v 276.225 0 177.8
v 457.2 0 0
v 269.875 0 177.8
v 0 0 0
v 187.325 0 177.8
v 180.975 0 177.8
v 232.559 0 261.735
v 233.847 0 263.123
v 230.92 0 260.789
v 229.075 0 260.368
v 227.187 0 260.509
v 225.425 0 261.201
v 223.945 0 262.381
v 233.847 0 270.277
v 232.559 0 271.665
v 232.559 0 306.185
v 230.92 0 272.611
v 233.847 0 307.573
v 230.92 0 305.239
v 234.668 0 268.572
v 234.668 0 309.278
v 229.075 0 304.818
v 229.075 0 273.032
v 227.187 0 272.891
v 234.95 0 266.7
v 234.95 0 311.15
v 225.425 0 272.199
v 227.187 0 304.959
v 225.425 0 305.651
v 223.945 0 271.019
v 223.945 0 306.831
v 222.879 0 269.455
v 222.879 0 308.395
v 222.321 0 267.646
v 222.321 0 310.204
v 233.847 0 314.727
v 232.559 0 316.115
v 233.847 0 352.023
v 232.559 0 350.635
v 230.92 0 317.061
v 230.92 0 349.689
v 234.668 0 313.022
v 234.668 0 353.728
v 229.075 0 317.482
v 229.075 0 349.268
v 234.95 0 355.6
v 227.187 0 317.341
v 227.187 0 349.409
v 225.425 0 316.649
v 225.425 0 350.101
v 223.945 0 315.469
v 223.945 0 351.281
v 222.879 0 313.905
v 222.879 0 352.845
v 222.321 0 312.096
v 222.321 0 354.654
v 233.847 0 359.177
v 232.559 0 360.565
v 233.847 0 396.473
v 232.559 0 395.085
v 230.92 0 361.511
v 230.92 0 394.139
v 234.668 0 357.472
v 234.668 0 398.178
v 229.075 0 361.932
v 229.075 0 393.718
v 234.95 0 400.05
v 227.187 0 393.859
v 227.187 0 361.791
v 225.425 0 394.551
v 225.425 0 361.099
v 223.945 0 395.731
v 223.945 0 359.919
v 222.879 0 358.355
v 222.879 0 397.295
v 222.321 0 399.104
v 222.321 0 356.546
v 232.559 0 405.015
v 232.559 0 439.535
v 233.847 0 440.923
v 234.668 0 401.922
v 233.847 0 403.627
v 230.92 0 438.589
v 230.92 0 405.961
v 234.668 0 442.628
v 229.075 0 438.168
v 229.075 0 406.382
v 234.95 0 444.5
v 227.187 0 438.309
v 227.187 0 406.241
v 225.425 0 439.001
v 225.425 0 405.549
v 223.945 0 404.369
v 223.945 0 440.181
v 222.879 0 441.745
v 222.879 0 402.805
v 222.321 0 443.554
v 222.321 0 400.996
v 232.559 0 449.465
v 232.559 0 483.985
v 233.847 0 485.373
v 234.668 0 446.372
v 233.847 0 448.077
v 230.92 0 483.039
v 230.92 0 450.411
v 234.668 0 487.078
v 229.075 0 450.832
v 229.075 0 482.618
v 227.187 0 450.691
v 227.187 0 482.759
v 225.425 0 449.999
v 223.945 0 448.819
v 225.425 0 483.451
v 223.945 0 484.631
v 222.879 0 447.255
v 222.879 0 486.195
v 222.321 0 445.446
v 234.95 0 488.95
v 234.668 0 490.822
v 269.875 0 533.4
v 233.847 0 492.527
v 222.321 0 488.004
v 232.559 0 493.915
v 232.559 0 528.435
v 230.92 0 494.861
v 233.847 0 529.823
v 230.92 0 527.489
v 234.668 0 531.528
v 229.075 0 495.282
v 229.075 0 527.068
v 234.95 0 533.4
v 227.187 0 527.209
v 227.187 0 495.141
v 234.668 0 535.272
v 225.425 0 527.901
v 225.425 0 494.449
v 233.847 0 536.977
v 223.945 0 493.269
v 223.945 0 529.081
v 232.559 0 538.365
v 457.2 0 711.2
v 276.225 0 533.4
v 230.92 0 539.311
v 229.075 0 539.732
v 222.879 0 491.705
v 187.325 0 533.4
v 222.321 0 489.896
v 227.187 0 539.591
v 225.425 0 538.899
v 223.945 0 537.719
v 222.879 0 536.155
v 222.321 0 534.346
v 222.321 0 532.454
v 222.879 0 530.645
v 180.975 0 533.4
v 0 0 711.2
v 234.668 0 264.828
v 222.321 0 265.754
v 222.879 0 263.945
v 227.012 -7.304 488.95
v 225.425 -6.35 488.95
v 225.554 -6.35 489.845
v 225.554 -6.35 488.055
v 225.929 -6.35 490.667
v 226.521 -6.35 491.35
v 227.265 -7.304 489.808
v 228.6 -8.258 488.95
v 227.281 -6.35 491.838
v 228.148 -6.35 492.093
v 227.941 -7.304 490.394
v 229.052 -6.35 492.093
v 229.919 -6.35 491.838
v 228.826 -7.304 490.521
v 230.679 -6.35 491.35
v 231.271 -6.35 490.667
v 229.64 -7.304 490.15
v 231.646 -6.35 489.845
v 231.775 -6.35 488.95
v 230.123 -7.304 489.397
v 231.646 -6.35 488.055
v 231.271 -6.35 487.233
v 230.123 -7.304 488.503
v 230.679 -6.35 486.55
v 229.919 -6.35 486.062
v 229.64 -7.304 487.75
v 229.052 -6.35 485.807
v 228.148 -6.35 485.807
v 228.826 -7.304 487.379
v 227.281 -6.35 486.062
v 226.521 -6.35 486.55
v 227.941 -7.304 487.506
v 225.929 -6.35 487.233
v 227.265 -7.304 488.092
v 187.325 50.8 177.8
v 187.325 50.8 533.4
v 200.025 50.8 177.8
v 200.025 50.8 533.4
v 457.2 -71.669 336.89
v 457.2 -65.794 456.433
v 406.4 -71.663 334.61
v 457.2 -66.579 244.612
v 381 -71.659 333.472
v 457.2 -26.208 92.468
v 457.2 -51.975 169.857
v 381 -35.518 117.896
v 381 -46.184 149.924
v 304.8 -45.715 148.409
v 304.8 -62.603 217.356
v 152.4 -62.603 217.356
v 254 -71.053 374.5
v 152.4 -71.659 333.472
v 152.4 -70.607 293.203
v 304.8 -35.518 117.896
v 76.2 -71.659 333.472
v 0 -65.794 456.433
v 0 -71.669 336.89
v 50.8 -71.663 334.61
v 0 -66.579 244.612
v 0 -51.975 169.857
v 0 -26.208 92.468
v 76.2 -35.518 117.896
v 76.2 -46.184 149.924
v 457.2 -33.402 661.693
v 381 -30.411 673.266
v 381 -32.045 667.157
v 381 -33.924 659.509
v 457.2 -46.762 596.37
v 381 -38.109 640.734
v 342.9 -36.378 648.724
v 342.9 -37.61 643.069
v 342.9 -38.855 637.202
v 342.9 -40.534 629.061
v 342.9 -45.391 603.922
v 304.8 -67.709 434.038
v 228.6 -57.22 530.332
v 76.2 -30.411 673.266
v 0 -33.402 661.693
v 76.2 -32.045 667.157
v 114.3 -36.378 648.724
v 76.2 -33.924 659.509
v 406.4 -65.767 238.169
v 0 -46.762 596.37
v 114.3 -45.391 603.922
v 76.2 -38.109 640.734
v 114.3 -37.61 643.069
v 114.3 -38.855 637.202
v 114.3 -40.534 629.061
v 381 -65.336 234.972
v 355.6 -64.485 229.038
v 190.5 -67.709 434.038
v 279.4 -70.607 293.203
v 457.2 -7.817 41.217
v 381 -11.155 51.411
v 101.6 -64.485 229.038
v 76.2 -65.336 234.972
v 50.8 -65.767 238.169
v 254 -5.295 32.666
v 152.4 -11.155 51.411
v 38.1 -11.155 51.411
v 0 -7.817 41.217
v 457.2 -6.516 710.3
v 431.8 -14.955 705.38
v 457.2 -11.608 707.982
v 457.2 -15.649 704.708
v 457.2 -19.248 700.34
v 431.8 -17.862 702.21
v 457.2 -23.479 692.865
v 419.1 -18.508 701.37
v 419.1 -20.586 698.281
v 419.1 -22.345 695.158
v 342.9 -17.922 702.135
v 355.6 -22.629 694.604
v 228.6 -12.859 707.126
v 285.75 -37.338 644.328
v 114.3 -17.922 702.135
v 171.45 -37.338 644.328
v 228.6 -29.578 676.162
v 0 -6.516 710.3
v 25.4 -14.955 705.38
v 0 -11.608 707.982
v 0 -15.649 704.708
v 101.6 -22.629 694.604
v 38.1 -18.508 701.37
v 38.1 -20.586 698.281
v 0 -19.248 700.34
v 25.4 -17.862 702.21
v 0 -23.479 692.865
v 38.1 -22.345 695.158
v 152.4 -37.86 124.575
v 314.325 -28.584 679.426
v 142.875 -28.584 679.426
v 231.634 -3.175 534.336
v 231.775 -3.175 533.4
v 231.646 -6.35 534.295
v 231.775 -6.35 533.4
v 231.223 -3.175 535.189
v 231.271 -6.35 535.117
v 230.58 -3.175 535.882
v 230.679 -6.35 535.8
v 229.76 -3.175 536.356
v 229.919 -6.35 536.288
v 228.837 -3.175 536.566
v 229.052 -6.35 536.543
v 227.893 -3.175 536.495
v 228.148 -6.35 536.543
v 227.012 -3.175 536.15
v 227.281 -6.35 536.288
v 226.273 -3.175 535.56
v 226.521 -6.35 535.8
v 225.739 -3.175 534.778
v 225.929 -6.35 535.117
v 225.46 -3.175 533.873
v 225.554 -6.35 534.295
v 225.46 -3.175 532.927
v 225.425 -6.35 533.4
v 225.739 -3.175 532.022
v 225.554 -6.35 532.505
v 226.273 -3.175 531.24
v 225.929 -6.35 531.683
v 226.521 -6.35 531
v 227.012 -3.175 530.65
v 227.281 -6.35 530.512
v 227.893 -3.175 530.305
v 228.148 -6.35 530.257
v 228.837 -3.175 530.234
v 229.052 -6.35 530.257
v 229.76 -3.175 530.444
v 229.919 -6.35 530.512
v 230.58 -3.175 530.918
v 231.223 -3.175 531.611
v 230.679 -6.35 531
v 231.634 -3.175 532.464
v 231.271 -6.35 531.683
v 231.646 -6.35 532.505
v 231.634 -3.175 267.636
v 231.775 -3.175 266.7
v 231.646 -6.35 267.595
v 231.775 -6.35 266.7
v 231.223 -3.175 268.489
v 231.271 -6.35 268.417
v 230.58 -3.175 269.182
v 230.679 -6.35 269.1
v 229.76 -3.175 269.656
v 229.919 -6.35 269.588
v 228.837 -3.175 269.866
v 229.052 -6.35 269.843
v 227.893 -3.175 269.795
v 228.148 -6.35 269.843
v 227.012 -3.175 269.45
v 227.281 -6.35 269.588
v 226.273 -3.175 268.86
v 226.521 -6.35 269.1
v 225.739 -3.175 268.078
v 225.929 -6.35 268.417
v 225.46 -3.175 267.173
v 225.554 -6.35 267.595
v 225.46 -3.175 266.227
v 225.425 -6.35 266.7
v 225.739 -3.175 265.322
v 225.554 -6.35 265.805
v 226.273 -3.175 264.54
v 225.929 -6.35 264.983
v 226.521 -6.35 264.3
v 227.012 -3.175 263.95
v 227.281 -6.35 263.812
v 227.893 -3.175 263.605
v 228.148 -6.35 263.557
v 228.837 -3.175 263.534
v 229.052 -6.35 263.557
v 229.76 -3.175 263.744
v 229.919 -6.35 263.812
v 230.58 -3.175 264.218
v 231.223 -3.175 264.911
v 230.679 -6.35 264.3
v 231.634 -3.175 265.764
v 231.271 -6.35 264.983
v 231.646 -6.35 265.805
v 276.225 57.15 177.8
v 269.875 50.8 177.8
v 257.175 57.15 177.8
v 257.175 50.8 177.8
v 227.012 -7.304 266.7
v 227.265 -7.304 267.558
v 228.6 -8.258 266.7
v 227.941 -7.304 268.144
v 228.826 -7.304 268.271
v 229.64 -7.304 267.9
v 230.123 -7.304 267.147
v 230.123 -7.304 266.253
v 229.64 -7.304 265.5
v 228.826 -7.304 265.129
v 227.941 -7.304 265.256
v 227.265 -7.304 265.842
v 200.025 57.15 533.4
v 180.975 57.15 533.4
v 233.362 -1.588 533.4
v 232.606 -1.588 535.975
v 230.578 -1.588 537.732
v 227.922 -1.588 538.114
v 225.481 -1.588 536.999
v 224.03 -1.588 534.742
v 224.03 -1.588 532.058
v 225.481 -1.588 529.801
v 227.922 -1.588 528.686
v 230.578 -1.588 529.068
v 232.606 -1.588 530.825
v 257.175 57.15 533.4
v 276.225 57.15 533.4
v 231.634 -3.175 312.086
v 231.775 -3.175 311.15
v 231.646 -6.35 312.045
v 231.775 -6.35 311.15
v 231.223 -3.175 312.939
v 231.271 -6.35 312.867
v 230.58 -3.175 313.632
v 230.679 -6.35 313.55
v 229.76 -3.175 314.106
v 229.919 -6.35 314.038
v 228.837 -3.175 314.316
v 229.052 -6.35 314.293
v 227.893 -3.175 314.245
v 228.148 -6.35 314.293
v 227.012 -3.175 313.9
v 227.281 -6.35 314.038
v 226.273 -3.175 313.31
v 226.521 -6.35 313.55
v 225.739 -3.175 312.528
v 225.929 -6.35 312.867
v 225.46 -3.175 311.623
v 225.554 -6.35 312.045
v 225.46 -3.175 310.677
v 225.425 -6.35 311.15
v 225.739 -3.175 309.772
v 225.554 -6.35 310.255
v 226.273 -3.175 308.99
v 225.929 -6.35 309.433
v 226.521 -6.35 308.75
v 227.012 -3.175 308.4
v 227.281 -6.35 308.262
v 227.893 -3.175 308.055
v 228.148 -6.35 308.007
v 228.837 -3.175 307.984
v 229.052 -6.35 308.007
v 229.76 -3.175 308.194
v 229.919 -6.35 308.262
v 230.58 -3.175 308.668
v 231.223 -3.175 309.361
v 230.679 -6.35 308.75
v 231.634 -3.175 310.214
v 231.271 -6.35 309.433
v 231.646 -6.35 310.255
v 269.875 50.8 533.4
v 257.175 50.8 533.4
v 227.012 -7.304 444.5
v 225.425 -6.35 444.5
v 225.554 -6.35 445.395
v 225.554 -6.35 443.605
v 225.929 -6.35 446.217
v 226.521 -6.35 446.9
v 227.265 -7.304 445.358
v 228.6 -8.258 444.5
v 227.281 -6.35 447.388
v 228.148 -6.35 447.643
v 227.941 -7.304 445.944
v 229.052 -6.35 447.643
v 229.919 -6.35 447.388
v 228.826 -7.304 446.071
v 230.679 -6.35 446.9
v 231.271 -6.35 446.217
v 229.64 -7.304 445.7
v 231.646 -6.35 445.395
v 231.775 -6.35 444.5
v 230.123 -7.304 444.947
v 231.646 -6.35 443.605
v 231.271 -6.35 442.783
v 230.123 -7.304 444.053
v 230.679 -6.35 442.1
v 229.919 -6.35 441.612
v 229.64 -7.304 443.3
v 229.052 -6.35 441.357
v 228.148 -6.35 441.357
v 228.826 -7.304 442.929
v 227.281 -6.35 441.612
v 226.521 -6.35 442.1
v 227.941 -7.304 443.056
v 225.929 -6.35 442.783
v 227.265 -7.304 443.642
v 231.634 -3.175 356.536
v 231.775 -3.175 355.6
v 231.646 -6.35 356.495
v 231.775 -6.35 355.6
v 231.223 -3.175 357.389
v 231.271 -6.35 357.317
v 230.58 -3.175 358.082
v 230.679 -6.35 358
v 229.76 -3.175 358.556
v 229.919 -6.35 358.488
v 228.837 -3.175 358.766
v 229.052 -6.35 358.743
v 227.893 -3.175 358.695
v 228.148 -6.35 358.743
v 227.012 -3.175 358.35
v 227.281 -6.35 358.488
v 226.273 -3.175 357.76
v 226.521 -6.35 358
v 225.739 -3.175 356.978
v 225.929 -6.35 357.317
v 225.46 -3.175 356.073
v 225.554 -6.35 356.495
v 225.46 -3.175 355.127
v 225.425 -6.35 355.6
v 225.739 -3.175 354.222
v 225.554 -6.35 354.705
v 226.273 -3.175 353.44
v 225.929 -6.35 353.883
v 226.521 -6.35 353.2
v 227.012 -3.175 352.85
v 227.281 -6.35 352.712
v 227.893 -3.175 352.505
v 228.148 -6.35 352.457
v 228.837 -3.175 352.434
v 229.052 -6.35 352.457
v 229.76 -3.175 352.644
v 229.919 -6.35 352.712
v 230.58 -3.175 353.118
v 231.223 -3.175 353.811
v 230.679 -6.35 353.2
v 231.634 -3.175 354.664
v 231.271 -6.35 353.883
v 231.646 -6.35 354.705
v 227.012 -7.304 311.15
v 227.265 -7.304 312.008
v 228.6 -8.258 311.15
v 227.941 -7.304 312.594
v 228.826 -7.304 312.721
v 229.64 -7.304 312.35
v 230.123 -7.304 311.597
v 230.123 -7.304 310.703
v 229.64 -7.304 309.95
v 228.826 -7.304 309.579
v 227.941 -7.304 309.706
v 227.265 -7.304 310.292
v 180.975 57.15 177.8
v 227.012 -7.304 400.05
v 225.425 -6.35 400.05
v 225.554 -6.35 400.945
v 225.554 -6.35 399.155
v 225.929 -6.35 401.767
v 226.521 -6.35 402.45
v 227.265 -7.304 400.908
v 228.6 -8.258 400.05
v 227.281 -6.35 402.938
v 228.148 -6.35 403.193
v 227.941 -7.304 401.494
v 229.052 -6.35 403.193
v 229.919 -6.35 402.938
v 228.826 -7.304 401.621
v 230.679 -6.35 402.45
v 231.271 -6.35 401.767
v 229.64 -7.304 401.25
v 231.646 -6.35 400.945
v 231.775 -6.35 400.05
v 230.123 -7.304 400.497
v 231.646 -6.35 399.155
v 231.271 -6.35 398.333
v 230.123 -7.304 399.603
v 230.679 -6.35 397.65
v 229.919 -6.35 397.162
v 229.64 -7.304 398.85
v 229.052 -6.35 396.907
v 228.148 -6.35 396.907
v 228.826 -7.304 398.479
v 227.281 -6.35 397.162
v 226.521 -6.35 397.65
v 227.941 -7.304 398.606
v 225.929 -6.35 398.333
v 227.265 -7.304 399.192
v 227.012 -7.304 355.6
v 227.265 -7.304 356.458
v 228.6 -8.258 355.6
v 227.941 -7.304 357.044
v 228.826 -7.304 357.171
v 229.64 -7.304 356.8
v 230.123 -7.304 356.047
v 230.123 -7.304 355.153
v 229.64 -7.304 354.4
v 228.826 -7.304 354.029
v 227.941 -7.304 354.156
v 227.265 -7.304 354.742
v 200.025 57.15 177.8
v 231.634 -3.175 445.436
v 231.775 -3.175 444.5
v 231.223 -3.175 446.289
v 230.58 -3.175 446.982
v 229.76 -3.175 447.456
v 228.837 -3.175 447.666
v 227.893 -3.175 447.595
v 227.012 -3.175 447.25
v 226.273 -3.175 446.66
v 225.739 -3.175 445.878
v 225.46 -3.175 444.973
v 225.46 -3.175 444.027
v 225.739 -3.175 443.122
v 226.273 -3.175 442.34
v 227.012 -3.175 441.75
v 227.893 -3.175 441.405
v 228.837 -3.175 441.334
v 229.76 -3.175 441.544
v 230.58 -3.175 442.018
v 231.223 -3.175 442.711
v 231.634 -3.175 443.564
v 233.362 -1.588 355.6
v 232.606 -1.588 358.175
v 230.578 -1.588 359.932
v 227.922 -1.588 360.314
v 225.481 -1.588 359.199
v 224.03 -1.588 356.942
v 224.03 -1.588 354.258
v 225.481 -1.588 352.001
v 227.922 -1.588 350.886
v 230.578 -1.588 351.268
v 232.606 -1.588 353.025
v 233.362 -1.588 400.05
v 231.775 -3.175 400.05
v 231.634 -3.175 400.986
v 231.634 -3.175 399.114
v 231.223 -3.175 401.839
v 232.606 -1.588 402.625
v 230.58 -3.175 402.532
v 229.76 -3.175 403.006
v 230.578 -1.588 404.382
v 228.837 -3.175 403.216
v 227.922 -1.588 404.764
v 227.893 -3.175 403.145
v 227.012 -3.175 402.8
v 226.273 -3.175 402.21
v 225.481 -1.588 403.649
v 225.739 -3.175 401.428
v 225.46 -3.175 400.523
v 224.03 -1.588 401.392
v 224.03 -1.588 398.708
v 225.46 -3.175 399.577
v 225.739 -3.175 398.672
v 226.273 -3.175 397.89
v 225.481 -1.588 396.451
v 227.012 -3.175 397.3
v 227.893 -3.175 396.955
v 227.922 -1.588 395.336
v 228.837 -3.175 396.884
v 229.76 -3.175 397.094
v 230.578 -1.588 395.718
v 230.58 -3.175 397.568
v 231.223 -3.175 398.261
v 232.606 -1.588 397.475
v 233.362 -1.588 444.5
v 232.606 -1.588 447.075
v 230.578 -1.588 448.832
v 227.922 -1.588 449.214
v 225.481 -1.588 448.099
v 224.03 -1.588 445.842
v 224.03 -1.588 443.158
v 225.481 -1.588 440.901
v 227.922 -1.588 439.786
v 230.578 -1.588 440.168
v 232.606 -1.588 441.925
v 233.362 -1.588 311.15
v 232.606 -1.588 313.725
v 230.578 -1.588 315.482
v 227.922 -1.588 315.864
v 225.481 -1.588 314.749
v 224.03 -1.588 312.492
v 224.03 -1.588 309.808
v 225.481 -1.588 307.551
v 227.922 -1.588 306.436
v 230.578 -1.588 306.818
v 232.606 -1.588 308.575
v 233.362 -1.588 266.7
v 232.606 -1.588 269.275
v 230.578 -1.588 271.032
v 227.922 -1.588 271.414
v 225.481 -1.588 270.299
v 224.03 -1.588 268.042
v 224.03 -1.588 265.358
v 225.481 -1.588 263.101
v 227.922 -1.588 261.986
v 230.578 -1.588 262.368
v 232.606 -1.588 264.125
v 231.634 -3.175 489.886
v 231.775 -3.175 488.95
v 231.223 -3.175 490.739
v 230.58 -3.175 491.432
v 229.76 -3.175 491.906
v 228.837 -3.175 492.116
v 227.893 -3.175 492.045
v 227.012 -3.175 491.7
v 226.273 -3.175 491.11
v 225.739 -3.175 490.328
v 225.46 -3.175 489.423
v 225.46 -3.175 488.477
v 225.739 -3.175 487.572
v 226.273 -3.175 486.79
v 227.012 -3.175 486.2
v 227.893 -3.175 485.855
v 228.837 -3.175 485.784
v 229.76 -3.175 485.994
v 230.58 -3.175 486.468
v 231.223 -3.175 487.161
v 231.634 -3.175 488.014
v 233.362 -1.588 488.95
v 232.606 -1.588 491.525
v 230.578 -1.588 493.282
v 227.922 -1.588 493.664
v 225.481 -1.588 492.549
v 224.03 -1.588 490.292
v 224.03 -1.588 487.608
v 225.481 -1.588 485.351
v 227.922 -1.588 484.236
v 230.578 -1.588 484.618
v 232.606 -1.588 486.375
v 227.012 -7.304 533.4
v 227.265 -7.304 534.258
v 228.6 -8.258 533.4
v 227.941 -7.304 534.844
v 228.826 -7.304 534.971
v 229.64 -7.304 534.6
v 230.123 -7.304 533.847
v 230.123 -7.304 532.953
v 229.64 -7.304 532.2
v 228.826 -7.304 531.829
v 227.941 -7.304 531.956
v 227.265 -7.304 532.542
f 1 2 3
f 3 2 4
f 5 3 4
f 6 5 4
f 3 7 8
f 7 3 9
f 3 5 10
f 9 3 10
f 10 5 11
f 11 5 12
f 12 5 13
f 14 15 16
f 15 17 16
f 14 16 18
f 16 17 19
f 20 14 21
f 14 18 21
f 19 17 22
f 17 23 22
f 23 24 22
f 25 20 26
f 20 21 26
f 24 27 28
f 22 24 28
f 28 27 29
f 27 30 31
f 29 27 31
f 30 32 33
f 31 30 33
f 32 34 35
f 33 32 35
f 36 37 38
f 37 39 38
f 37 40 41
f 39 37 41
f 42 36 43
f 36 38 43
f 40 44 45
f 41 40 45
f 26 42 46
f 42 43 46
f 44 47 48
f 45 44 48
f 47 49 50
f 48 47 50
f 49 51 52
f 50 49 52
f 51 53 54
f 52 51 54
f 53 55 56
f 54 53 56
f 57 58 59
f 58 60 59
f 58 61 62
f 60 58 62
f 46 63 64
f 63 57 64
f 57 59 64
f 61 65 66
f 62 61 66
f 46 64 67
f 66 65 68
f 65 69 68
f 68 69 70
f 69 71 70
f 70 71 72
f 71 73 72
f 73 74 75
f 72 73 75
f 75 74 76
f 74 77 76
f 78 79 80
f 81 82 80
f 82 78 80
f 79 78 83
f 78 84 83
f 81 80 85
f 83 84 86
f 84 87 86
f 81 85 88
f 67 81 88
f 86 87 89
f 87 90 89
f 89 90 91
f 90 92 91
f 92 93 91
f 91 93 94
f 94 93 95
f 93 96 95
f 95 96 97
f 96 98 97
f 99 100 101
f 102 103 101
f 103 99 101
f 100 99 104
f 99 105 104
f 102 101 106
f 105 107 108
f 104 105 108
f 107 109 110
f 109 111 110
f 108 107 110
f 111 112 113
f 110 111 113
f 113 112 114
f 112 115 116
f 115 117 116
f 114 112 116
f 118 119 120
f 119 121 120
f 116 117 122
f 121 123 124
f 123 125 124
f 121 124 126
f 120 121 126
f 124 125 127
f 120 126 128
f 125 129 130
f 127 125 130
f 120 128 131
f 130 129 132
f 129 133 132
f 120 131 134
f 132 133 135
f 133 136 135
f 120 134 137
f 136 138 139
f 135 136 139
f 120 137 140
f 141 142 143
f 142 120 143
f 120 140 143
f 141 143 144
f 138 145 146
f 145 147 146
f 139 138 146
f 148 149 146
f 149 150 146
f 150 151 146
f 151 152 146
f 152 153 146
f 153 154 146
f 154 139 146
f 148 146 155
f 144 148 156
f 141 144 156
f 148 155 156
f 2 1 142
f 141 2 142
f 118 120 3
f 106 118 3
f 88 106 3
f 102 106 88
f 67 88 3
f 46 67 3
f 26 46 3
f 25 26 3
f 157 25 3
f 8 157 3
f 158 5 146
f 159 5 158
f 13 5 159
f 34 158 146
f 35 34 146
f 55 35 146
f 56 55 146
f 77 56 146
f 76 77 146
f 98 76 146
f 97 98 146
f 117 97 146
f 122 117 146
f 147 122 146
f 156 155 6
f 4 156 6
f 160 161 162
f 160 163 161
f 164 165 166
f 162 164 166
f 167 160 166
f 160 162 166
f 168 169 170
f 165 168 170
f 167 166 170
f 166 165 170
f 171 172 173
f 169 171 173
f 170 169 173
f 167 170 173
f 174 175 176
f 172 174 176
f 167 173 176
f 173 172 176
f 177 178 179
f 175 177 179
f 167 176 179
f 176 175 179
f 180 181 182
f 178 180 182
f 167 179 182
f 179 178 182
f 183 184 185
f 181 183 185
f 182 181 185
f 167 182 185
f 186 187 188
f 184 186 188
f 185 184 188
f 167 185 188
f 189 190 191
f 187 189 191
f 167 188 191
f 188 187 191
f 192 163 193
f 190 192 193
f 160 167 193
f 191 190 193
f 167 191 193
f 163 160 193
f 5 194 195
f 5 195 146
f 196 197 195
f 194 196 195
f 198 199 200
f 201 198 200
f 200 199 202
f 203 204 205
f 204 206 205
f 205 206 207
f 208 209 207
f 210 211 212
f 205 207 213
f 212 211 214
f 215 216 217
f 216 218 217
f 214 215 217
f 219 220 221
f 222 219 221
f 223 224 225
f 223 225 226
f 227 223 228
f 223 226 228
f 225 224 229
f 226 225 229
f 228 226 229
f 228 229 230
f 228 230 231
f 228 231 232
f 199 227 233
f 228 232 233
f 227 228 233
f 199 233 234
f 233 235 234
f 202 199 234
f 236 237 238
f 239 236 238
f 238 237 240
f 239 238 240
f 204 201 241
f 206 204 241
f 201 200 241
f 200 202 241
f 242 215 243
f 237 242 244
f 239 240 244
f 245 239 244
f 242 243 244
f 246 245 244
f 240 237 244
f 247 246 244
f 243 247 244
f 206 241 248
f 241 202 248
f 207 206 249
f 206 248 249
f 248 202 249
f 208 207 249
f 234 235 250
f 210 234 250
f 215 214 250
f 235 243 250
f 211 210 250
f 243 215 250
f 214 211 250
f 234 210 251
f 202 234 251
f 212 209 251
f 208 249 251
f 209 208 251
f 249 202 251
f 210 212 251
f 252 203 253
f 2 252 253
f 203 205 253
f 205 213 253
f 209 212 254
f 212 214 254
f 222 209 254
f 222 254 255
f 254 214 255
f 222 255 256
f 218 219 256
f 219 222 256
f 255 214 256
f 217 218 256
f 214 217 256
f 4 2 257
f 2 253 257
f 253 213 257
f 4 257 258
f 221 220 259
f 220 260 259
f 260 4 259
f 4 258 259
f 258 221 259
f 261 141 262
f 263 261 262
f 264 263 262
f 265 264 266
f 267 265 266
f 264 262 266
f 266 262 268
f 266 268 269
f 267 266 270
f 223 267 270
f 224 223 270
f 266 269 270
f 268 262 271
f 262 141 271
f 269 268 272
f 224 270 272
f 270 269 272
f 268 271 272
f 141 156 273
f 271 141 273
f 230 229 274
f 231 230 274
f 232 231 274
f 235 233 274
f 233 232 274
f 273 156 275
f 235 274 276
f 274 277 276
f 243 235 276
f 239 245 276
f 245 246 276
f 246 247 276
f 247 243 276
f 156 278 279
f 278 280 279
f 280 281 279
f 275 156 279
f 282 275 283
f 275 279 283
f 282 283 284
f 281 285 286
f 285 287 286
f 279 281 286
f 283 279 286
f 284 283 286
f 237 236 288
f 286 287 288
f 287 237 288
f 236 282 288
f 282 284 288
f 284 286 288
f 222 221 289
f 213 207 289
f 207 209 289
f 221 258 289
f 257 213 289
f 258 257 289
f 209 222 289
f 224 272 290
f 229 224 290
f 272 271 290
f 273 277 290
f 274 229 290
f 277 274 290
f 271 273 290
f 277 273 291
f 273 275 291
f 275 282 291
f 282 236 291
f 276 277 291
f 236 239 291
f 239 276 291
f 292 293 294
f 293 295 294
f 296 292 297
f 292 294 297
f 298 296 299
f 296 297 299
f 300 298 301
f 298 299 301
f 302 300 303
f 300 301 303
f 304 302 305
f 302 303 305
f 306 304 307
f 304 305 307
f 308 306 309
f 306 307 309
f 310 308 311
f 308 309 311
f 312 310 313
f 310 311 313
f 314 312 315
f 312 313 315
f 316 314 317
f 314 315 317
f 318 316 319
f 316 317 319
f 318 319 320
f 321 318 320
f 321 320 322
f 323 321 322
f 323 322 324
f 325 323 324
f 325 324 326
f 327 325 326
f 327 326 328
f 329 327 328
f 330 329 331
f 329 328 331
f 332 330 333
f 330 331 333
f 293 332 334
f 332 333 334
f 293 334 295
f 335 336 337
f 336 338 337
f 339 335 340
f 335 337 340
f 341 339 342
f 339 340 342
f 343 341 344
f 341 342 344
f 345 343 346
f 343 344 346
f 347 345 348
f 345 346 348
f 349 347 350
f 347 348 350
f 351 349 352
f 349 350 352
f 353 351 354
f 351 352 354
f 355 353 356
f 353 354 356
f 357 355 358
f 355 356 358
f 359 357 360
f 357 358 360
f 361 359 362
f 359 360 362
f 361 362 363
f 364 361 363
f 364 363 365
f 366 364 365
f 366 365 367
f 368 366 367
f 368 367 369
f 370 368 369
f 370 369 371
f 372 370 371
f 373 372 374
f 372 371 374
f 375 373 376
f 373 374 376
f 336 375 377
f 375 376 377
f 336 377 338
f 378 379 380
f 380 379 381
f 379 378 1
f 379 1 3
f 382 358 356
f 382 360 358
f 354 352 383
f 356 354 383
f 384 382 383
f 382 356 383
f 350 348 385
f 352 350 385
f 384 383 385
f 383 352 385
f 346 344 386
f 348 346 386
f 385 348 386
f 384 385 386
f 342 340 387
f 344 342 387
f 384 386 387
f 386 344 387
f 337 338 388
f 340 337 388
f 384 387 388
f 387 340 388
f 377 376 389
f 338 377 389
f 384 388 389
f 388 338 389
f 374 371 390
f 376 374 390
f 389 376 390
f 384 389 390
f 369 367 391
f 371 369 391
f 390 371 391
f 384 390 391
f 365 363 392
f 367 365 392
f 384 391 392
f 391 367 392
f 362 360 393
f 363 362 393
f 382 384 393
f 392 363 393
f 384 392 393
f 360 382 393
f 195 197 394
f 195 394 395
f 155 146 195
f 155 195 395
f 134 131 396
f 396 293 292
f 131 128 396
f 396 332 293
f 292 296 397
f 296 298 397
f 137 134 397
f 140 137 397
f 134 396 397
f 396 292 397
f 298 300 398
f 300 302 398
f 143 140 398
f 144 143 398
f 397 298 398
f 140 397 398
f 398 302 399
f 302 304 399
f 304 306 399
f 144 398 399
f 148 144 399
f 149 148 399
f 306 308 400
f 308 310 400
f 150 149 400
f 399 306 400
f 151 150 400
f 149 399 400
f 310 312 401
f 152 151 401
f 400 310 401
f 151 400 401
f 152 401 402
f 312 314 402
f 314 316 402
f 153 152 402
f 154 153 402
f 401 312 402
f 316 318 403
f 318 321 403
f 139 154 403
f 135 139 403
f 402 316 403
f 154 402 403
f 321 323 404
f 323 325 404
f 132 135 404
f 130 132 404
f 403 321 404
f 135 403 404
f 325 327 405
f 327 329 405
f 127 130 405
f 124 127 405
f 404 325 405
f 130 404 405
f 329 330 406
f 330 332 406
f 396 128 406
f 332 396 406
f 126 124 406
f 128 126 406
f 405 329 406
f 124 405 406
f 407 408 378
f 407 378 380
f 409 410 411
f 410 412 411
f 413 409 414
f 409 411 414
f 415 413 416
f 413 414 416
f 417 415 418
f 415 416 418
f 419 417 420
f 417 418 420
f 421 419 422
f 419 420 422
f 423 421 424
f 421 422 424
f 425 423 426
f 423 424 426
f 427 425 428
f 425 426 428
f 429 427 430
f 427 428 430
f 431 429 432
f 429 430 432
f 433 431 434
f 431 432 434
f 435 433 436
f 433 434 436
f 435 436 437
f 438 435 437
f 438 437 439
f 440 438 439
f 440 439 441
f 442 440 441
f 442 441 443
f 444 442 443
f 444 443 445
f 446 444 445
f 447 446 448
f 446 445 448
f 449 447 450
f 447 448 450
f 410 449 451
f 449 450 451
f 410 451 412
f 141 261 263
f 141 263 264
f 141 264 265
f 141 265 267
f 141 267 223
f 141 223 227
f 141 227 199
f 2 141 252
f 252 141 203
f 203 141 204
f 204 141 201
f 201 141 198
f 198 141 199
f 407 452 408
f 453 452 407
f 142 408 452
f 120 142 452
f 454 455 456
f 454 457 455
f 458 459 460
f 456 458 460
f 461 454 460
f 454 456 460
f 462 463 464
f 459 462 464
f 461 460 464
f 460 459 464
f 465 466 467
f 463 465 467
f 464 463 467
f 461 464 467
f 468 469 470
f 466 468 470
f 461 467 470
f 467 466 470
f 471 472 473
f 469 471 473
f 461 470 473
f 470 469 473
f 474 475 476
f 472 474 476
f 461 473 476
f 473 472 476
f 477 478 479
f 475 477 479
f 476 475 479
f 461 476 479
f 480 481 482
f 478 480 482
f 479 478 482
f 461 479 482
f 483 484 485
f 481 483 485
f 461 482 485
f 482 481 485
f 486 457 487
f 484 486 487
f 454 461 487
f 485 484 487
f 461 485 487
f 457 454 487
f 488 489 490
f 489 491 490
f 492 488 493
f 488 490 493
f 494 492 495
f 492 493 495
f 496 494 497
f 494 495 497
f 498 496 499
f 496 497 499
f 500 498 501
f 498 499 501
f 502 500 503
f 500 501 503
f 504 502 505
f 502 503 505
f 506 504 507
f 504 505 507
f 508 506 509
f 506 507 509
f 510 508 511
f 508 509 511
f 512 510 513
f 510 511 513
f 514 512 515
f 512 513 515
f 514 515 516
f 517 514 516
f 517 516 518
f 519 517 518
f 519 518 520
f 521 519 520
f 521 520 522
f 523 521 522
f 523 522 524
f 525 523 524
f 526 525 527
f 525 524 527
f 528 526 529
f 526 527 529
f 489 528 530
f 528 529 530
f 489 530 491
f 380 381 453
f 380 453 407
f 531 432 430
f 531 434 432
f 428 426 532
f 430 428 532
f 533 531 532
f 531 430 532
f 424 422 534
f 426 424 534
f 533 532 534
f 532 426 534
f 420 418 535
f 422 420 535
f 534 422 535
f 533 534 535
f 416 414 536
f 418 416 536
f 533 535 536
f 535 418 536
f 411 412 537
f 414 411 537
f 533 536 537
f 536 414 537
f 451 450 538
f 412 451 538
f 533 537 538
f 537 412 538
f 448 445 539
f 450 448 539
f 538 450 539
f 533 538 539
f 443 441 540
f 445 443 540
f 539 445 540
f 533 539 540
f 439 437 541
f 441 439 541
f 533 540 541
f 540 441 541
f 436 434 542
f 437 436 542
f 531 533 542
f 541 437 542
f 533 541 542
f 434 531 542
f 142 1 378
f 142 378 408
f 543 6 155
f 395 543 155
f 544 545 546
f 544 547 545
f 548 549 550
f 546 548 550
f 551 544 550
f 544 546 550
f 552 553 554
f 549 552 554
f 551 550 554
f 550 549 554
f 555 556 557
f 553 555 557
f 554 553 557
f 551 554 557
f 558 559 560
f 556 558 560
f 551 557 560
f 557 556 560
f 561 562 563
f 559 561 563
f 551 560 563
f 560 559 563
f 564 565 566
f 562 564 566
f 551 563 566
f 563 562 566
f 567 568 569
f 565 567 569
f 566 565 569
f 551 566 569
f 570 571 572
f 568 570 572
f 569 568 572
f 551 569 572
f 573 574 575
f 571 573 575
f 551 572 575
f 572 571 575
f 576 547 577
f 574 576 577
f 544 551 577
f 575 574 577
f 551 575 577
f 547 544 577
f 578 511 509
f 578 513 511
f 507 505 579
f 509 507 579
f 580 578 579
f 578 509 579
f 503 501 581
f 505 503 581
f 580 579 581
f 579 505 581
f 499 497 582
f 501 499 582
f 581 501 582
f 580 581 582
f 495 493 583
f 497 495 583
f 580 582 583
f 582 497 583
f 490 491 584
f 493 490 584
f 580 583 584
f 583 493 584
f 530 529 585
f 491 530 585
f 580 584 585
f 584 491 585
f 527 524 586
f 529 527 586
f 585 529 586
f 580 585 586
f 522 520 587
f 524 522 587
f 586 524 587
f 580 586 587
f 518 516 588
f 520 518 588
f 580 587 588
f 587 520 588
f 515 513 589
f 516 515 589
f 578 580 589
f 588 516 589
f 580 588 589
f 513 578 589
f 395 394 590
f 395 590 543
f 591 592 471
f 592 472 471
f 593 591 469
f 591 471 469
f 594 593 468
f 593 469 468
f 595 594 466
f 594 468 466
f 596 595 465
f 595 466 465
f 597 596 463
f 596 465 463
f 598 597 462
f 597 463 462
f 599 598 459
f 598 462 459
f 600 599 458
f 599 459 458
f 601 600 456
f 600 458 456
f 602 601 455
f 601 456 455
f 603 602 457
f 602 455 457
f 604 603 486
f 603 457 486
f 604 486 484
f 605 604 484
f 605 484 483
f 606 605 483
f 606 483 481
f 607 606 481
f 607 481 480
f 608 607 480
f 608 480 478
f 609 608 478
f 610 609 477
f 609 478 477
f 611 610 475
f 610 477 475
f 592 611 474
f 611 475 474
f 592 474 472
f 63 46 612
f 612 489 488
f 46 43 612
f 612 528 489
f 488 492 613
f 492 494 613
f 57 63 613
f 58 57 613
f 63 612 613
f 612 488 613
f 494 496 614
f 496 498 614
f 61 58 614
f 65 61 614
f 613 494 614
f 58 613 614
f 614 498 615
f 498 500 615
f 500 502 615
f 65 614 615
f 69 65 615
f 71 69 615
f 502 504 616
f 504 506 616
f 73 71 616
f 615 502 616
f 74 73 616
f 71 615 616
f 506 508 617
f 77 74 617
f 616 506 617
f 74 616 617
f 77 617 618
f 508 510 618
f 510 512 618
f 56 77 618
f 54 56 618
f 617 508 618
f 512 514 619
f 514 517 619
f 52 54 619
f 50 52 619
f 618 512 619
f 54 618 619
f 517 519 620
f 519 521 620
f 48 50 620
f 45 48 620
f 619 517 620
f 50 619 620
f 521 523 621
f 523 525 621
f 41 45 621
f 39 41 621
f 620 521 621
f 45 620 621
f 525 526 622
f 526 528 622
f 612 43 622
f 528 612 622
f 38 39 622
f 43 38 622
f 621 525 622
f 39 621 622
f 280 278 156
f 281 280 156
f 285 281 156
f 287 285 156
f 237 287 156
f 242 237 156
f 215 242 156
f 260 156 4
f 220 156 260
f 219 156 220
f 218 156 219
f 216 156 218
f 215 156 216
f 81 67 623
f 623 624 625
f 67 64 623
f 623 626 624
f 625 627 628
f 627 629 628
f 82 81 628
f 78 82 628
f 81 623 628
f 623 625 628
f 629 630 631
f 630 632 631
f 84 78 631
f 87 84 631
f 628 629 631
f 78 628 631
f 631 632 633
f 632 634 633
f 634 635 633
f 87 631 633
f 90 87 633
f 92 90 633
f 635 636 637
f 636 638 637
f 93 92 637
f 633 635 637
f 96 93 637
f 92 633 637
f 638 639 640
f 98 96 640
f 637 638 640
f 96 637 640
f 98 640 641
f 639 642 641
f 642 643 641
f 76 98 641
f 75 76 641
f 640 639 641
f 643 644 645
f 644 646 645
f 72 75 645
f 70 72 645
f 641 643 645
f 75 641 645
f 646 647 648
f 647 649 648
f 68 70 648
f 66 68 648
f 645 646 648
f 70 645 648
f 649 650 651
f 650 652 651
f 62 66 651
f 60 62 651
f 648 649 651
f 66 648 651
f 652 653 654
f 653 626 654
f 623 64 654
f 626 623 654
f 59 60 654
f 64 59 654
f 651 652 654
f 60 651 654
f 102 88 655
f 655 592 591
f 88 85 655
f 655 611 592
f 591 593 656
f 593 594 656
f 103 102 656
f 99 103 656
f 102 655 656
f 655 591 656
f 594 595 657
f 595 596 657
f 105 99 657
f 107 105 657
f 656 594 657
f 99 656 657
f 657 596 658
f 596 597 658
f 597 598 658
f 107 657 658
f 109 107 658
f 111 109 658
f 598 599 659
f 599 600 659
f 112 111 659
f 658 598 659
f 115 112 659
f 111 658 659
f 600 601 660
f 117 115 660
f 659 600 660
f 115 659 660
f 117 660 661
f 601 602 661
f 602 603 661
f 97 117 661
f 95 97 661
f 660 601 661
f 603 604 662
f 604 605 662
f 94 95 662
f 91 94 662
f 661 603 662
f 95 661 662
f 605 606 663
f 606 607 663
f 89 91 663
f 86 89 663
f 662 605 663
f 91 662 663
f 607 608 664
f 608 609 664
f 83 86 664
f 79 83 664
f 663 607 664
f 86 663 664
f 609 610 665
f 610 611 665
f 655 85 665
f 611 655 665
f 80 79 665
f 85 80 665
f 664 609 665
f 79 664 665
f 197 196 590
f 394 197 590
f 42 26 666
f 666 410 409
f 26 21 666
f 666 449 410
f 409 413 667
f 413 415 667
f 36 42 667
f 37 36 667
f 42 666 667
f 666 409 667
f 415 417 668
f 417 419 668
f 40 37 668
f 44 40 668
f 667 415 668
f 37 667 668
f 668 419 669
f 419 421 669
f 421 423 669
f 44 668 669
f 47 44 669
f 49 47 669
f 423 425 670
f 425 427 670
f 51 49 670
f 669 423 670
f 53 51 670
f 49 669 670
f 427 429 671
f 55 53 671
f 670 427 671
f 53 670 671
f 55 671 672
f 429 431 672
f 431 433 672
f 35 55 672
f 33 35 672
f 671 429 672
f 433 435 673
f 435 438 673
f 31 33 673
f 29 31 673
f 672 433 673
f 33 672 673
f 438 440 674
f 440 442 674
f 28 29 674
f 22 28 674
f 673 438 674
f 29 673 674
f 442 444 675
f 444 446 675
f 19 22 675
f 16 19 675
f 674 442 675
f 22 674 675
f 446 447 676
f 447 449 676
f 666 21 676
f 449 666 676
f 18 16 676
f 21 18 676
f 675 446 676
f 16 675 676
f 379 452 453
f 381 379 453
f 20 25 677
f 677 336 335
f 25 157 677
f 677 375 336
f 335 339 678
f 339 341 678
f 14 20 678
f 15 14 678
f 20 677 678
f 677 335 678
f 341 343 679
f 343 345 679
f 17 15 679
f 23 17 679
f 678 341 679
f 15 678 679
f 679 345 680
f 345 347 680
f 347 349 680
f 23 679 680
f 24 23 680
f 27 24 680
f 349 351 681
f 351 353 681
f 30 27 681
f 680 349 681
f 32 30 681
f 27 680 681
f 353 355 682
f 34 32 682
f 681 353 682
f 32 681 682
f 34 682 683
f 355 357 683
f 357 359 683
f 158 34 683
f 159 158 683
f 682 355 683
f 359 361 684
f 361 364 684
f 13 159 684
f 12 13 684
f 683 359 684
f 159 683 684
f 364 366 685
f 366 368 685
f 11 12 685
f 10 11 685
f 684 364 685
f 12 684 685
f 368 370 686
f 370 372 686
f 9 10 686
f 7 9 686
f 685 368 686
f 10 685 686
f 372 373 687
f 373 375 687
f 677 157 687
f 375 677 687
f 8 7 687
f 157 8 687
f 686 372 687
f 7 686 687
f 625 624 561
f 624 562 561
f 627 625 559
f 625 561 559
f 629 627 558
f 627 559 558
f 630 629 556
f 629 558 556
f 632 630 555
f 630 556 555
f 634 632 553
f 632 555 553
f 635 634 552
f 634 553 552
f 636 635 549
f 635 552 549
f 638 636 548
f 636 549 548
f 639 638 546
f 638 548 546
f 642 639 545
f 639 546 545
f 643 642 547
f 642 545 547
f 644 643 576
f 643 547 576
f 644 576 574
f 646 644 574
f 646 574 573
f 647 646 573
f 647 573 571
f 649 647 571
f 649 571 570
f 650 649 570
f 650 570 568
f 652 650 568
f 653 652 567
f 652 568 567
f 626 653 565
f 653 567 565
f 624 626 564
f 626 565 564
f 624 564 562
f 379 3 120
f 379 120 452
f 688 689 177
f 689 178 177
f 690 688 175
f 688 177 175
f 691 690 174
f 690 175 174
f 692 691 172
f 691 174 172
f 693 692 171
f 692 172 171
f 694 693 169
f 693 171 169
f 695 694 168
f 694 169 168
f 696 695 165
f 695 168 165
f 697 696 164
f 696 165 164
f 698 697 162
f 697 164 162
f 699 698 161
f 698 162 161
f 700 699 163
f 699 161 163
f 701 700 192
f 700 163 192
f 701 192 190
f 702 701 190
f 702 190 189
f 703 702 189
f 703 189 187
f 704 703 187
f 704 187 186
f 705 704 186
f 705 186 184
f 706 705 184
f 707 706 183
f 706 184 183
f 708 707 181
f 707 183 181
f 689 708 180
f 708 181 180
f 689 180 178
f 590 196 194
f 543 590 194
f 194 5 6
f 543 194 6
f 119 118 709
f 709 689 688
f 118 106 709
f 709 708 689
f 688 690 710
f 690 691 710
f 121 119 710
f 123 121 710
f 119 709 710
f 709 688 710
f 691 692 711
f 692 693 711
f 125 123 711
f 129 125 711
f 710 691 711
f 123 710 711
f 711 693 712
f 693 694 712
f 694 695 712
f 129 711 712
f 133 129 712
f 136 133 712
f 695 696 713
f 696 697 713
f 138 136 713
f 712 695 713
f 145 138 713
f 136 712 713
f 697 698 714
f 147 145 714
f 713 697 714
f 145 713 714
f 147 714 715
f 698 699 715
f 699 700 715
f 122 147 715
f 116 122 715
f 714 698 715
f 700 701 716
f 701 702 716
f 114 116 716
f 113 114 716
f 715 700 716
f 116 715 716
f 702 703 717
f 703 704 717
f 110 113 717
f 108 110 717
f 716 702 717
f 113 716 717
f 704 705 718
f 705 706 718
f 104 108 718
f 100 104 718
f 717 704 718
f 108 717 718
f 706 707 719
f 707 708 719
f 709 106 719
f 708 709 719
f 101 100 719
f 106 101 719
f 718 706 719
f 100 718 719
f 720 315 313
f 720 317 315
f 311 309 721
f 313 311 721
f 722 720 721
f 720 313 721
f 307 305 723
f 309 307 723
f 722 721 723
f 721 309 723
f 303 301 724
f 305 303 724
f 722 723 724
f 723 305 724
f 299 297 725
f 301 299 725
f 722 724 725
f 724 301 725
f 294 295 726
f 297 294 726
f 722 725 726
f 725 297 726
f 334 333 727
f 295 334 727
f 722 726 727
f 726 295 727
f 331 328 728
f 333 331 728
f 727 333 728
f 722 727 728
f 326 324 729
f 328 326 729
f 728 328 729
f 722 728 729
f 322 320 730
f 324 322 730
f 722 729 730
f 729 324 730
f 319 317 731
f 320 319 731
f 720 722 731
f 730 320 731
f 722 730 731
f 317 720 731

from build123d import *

# Parameters (mm, degrees)
F1_DEPTH       = 457.2
F2_W           = 95.25
F2_H           = 355.6
F3_DEPTH       = 57.15
F4_W           = 57.15
F4_H           = 6.35
F5_DEPTH       = 355.6
F7_D           = 6.35
F7_DEPTH       = 6.35
F7_CSINK_D     = 12.7
F7_CSINK_ANGLE = 90
F7_TIP         = 1.9077324654


with BuildPart() as f1:
    # F0 (on Right) → F1 (new body)
    with BuildSketch(Plane.YZ):
        with BuildLine():
            Line((0, 0), (0, 711.2))
            add(Edge.make_bspline(
                [(0, 711.2), (-20.1591427607, 711.2), (-45.7016939777, 633.1559120736), (-107.7342542848, 213.8871421657), (0, 46.9480343163), (0, 0)],
                knots=[0, 0, 0, 0, 0.1909577513, 0.6605552896, 1, 1, 1, 1], degree=3))
        make_face()
    extrude(amount=F1_DEPTH)

    # F2 (on face) → F3 (join)
    with BuildSketch(Plane(origin=(0, 0, 0), x_dir=(-1, 0, 0), z_dir=(0, 1, 0))):
        with Locations((-228.6, 355.6)):
            Rectangle(F2_W, F2_H)
    extrude(amount=F3_DEPTH)

    # F4 (on face) → F5 (cut)
    with BuildSketch(Plane.XY.offset(533.4)):
        Polygon((269.875, 50.8), (257.175, 50.8), (200.025, 50.8), (187.325, 50.8), (187.325, 0), (269.875, 0), align=None)
        with Locations((228.6, 53.975)):
            Rectangle(F4_W, F4_H)
    extrude(amount=-F5_DEPTH, mode=Mode.SUBTRACT)

    # F7
    with Locations(Plane(origin=(0, 0, 0), x_dir=(-1, 0, 0), z_dir=(0, 1, 0))):
        with Locations((-228.6, 533.4), (-228.6, 488.95), (-228.6, 444.5), (-228.6, 400.05), (-228.6, 355.6), (-228.6, 311.15), (-228.6, 266.7)):
            CounterSinkHole(F7_D / 2, F7_CSINK_D / 2, depth=F7_DEPTH, counter_sink_angle=F7_CSINK_ANGLE)
            with Locations((0, 0, -(F7_DEPTH + F7_TIP / 2))):  # 118° drill point
                Cone(0, F7_D / 2, F7_TIP, mode=Mode.SUBTRACT)


solid = f1.part
